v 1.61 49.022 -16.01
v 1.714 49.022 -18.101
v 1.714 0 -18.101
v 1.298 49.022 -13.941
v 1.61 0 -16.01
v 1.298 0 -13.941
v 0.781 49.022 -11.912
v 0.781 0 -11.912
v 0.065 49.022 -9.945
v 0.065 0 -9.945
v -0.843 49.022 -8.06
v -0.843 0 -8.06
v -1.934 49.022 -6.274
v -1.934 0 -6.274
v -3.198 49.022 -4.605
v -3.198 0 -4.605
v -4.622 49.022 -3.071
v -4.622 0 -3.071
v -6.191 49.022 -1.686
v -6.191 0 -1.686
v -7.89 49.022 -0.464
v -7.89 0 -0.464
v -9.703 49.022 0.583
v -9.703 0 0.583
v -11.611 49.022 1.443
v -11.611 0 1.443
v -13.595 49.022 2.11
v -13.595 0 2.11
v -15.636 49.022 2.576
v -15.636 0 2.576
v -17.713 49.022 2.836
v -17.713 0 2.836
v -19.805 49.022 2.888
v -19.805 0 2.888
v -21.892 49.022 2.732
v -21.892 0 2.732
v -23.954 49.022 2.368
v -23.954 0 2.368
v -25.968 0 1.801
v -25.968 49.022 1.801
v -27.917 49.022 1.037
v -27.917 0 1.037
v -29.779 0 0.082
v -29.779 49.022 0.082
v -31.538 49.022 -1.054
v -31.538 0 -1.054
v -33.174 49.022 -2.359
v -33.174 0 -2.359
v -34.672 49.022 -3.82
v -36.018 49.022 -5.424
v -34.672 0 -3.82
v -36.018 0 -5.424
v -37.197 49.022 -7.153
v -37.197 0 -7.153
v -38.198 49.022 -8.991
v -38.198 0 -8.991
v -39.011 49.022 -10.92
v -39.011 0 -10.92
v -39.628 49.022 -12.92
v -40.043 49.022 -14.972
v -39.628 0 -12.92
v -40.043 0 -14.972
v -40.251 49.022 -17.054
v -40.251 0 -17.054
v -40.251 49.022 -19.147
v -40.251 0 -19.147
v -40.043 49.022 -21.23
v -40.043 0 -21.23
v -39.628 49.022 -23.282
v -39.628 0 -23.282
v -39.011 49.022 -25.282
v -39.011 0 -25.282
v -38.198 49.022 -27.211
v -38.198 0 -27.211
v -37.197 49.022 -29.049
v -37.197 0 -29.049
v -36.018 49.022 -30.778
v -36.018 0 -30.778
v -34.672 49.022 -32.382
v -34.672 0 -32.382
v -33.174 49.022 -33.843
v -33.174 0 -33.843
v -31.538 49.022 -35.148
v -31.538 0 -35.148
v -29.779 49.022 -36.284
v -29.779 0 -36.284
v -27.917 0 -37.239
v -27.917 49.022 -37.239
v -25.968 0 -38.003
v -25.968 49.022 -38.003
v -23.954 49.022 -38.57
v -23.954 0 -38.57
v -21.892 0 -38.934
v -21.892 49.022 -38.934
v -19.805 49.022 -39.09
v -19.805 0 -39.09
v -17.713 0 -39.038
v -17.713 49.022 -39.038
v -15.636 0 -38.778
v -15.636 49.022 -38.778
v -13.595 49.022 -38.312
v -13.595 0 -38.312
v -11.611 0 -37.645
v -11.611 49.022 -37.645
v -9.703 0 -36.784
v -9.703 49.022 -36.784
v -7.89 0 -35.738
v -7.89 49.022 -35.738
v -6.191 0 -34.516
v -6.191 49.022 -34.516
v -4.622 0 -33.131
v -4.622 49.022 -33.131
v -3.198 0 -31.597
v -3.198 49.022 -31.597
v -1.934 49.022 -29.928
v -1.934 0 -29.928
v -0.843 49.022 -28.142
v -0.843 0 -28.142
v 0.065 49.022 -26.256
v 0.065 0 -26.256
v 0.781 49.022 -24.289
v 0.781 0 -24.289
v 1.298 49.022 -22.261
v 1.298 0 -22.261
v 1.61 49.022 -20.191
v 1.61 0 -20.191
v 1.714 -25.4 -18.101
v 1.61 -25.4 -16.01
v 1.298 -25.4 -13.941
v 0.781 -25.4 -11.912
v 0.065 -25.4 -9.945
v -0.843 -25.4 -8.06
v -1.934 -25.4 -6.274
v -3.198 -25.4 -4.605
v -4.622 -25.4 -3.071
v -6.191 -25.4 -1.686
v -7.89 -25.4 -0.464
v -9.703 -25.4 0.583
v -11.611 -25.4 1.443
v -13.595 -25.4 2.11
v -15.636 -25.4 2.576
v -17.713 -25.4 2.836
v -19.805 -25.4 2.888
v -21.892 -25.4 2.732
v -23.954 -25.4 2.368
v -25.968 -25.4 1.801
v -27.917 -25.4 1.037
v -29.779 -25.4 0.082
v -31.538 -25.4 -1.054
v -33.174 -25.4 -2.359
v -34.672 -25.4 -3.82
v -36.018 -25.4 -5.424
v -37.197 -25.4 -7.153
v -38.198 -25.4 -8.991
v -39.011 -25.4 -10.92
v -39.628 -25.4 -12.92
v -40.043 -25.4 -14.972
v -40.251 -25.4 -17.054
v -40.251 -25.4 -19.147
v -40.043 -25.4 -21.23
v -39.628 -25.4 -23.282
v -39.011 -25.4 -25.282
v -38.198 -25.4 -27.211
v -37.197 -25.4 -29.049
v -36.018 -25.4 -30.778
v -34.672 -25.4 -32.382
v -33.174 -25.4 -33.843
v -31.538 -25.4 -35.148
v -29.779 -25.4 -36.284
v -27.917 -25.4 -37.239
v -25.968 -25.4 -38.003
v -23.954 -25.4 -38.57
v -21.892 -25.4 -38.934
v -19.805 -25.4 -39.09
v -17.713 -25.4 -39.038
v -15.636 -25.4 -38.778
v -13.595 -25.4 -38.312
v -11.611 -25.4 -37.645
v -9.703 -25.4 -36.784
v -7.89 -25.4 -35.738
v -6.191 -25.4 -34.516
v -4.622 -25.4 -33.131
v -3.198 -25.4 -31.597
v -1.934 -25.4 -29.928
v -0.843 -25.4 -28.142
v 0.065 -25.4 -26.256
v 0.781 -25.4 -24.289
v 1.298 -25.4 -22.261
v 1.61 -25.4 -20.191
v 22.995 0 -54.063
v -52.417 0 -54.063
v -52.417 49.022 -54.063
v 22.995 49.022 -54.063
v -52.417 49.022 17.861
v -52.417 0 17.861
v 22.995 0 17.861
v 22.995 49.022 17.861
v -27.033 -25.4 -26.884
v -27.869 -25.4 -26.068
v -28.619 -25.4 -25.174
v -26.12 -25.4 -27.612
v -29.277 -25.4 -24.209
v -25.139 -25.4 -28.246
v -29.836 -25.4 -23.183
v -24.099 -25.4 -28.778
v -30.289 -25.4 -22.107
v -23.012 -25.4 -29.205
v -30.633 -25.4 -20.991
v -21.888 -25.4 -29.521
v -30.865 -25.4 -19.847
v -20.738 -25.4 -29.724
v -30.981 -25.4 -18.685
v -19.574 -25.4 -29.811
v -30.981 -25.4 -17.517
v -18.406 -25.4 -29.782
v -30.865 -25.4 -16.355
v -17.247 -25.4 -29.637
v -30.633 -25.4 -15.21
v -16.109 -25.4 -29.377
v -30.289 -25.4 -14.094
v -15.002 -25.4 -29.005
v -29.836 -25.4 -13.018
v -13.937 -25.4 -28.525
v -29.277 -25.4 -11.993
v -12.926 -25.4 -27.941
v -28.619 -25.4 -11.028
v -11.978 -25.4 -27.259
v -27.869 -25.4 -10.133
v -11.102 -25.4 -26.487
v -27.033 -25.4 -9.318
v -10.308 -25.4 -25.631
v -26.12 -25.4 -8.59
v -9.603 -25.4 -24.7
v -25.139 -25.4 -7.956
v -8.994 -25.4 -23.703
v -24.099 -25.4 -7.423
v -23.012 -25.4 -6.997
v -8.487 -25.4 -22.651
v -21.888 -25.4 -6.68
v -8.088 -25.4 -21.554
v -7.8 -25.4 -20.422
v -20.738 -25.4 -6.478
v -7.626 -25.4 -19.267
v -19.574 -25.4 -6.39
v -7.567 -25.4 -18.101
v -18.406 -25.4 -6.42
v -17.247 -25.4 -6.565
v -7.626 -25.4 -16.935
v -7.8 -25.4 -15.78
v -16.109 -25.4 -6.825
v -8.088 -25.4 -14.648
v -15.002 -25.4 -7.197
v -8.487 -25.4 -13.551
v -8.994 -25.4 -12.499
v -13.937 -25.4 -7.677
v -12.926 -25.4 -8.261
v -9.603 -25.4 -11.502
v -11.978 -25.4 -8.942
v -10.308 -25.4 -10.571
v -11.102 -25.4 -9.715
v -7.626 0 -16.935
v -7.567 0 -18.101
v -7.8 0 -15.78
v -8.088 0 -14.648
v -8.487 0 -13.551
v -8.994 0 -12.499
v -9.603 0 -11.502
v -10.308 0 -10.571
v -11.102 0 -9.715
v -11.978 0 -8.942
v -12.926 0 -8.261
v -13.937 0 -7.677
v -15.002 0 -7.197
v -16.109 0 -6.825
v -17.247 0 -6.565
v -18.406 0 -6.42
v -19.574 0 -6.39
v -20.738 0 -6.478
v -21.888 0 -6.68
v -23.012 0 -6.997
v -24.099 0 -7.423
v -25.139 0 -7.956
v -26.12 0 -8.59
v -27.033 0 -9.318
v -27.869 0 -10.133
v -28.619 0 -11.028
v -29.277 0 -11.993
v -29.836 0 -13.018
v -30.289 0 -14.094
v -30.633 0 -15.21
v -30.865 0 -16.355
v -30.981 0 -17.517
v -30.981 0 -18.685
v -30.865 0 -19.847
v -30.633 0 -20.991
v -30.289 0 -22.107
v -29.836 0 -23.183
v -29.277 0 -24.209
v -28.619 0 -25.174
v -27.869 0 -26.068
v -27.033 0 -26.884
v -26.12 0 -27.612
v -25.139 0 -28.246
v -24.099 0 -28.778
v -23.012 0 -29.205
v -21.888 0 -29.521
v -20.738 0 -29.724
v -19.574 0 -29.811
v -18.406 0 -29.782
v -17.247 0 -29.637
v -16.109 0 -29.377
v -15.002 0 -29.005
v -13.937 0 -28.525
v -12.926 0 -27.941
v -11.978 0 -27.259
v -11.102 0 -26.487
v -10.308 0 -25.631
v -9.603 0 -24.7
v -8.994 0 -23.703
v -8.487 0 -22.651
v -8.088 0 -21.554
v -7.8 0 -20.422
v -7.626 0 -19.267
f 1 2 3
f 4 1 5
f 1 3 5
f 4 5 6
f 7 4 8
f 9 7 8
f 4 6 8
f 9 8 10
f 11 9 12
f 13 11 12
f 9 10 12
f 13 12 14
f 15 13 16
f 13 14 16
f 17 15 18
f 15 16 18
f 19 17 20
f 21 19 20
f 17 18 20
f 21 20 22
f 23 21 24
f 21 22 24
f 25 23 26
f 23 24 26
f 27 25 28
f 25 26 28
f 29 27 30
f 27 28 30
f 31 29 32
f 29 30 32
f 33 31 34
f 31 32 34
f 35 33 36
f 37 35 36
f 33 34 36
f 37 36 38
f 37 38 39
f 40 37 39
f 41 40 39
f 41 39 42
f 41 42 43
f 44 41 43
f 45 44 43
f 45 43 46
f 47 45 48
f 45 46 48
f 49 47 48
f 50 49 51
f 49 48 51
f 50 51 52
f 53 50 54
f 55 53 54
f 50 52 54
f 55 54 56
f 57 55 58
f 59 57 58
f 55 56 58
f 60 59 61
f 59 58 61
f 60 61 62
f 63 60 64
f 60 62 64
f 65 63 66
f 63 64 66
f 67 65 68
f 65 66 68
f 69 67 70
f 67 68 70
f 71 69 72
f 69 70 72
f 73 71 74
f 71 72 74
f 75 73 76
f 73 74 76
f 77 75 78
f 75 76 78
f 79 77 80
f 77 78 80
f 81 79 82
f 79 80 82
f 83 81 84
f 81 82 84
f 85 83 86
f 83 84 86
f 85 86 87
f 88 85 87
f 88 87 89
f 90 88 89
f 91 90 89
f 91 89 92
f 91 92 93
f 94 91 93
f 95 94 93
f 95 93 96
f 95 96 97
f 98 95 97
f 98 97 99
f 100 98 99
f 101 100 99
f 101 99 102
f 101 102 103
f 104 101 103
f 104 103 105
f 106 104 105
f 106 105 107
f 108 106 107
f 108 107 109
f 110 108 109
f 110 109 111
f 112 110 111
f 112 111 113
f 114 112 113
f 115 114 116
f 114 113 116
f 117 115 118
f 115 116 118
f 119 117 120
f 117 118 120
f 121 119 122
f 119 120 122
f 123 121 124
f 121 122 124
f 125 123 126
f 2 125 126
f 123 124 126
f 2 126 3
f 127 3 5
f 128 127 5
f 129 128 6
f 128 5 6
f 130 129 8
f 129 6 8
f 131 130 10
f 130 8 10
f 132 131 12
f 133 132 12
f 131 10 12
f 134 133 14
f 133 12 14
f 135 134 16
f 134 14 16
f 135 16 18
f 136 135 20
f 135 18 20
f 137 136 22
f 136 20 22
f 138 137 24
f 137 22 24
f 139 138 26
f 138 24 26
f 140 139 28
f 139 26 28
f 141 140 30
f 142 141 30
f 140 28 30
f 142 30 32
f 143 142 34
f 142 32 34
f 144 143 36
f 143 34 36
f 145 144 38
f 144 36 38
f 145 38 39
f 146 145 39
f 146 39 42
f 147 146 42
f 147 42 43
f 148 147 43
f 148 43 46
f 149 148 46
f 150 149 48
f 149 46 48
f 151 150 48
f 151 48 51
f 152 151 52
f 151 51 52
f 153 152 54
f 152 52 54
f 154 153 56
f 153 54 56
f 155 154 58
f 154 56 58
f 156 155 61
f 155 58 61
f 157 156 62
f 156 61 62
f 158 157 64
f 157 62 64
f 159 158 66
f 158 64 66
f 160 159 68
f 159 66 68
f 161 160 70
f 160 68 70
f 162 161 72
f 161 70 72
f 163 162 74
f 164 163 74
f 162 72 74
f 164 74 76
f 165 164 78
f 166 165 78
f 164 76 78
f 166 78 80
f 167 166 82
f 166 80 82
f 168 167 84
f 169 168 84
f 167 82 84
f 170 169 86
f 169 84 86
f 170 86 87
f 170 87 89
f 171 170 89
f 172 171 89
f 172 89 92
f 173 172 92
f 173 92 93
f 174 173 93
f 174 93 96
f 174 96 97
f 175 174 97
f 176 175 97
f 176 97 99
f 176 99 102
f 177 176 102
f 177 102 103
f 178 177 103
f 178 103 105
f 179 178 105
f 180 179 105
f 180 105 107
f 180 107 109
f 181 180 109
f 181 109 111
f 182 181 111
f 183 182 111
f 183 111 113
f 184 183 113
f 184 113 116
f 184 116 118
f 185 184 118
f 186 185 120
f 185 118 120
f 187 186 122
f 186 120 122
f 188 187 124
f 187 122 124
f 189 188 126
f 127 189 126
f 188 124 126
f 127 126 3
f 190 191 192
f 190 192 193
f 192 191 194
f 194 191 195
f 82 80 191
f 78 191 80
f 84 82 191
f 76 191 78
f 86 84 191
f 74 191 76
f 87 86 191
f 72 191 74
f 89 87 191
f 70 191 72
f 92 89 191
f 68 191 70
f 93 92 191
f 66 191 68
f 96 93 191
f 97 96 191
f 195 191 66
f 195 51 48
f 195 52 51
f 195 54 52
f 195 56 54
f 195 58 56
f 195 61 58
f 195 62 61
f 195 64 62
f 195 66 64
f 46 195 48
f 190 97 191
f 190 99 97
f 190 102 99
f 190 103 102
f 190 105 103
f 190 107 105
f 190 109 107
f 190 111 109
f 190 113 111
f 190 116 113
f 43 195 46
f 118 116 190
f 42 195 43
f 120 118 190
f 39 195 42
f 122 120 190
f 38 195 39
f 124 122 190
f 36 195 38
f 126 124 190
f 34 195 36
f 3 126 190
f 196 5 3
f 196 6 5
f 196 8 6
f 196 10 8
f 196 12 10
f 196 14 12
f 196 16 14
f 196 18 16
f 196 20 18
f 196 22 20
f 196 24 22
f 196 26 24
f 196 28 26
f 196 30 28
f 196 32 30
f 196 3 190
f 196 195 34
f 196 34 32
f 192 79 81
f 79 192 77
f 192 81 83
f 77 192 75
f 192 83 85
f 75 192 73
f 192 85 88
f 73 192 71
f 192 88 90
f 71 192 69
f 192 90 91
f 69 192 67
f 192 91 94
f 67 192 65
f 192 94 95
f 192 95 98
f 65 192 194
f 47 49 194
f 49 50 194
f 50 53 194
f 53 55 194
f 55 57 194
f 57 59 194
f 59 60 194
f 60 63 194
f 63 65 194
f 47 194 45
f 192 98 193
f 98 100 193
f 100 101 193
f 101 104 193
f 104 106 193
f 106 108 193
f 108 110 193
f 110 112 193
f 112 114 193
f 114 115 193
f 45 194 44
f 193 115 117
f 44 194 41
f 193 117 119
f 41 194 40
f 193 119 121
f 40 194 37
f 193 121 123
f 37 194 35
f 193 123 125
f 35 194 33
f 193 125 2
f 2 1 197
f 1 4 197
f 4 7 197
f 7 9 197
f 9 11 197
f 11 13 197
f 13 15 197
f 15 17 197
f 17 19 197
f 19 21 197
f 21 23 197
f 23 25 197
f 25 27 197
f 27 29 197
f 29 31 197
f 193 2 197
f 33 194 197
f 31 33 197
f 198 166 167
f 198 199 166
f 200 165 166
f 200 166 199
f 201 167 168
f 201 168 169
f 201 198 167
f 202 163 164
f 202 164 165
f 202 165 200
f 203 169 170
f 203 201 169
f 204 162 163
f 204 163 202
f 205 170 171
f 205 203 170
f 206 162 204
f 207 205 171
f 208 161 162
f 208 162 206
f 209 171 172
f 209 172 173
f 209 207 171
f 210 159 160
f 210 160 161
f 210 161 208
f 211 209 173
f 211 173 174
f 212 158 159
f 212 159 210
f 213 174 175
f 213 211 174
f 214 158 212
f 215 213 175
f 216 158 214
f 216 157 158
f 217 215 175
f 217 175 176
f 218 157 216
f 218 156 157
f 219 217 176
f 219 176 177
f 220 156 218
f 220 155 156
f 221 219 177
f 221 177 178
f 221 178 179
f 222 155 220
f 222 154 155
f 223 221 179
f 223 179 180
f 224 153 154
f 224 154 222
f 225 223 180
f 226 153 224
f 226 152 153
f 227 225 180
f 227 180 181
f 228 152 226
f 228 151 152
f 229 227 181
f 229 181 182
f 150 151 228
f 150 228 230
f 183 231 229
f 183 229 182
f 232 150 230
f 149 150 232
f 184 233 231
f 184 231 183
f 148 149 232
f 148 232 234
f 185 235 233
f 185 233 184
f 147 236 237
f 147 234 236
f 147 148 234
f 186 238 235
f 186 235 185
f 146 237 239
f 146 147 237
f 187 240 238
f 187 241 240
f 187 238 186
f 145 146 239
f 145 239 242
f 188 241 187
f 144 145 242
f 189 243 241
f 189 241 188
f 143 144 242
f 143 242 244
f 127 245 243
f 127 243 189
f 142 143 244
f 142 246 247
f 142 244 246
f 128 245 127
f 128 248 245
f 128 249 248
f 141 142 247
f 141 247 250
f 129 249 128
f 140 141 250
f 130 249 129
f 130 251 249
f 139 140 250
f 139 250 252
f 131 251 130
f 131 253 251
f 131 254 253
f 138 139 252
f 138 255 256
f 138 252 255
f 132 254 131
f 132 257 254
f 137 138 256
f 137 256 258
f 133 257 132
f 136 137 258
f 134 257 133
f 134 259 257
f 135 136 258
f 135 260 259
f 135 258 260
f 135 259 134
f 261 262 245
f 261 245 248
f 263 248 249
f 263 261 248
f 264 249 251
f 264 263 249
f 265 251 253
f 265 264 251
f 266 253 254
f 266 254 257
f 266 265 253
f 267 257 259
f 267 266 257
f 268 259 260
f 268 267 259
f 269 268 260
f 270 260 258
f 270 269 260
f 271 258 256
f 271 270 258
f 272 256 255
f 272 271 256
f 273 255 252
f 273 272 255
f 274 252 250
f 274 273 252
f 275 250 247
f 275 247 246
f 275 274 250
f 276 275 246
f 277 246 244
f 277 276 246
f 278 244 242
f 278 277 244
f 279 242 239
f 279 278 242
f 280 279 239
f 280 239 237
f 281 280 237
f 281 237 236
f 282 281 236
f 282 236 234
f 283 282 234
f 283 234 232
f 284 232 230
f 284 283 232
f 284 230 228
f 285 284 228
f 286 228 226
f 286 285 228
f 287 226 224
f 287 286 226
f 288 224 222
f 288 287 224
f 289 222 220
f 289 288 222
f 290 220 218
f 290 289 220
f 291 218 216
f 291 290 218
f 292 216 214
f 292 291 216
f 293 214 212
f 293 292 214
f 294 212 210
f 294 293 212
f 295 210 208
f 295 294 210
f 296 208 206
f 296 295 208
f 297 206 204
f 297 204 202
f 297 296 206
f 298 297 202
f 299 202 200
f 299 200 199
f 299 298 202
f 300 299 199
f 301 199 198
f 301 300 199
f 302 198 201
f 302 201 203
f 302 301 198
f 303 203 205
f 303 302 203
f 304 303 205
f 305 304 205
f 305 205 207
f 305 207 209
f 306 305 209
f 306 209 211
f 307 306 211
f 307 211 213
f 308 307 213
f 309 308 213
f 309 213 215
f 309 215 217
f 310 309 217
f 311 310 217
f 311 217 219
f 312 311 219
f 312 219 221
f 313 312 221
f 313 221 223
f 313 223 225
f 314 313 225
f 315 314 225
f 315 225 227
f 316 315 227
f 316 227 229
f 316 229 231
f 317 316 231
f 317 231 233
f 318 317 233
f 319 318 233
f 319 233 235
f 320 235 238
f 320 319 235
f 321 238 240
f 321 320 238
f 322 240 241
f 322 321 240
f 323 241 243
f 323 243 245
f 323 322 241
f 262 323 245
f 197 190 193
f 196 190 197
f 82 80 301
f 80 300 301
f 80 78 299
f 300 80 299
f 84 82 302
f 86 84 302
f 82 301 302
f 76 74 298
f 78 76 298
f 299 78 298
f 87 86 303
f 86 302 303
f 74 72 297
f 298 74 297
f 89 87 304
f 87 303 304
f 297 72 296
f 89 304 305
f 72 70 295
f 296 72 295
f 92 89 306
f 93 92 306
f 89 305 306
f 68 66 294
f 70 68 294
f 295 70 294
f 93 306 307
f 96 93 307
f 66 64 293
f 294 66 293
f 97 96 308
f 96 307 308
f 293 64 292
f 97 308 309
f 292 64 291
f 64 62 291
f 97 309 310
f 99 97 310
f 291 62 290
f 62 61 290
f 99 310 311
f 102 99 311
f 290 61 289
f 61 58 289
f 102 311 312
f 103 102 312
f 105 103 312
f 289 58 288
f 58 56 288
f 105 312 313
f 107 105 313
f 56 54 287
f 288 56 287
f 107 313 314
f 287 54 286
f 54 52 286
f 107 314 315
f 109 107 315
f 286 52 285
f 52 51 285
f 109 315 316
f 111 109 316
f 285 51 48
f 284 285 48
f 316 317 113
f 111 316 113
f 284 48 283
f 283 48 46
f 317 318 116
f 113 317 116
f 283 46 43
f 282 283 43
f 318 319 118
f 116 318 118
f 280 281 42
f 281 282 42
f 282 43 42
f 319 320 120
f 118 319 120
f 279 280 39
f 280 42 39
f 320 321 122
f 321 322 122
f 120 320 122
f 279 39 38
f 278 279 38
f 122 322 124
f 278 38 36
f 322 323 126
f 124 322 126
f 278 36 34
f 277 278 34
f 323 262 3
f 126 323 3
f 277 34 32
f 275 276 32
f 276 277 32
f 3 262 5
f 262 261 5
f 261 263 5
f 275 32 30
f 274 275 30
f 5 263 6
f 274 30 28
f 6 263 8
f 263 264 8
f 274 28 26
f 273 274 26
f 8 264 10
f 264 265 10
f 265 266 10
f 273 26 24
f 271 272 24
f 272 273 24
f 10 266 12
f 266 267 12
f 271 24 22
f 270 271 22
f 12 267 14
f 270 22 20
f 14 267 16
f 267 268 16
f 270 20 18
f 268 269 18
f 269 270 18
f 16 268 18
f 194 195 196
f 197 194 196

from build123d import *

# Parameters (mm, degrees)
F0_W     = 75.412262
F0_H     = 71.924368
F0_R     = 20.995672
F1_DEPTH = 49.022
F0_R_2   = 11.714124
F2_DEPTH = 49.023
F3_DEPTH = 25.4


with BuildPart() as f1:
    # F0 (on Front) → F1 (new body)
    with BuildSketch(Plane.XZ):
        with Locations((-14.711099, -18.100872)):
            Rectangle(F0_W, F0_H)
        with Locations((-19.281544, -18.100872)):
            Circle(F0_R, mode=Mode.SUBTRACT)
    extrude(amount=-F1_DEPTH)

    # F0 (on Front) → F2 (cut, through all)
    with BuildSketch(Plane.XZ):
        with Locations((-19.281544, -18.100872)):
            Circle(F0_R_2)
    extrude(amount=-F2_DEPTH, mode=Mode.SUBTRACT)


with BuildPart() as f3:
    # F0 (on Front) → F3 (new body)
    with BuildSketch(Plane.XZ):
        with Locations((-19.281544, -18.100872)):
            Circle(F0_R)
        with Locations((-19.281544, -18.100872)):
            Circle(F0_R_2, mode=Mode.SUBTRACT)
    extrude(amount=F3_DEPTH)


solid = Compound([f1.part, f3.part])
